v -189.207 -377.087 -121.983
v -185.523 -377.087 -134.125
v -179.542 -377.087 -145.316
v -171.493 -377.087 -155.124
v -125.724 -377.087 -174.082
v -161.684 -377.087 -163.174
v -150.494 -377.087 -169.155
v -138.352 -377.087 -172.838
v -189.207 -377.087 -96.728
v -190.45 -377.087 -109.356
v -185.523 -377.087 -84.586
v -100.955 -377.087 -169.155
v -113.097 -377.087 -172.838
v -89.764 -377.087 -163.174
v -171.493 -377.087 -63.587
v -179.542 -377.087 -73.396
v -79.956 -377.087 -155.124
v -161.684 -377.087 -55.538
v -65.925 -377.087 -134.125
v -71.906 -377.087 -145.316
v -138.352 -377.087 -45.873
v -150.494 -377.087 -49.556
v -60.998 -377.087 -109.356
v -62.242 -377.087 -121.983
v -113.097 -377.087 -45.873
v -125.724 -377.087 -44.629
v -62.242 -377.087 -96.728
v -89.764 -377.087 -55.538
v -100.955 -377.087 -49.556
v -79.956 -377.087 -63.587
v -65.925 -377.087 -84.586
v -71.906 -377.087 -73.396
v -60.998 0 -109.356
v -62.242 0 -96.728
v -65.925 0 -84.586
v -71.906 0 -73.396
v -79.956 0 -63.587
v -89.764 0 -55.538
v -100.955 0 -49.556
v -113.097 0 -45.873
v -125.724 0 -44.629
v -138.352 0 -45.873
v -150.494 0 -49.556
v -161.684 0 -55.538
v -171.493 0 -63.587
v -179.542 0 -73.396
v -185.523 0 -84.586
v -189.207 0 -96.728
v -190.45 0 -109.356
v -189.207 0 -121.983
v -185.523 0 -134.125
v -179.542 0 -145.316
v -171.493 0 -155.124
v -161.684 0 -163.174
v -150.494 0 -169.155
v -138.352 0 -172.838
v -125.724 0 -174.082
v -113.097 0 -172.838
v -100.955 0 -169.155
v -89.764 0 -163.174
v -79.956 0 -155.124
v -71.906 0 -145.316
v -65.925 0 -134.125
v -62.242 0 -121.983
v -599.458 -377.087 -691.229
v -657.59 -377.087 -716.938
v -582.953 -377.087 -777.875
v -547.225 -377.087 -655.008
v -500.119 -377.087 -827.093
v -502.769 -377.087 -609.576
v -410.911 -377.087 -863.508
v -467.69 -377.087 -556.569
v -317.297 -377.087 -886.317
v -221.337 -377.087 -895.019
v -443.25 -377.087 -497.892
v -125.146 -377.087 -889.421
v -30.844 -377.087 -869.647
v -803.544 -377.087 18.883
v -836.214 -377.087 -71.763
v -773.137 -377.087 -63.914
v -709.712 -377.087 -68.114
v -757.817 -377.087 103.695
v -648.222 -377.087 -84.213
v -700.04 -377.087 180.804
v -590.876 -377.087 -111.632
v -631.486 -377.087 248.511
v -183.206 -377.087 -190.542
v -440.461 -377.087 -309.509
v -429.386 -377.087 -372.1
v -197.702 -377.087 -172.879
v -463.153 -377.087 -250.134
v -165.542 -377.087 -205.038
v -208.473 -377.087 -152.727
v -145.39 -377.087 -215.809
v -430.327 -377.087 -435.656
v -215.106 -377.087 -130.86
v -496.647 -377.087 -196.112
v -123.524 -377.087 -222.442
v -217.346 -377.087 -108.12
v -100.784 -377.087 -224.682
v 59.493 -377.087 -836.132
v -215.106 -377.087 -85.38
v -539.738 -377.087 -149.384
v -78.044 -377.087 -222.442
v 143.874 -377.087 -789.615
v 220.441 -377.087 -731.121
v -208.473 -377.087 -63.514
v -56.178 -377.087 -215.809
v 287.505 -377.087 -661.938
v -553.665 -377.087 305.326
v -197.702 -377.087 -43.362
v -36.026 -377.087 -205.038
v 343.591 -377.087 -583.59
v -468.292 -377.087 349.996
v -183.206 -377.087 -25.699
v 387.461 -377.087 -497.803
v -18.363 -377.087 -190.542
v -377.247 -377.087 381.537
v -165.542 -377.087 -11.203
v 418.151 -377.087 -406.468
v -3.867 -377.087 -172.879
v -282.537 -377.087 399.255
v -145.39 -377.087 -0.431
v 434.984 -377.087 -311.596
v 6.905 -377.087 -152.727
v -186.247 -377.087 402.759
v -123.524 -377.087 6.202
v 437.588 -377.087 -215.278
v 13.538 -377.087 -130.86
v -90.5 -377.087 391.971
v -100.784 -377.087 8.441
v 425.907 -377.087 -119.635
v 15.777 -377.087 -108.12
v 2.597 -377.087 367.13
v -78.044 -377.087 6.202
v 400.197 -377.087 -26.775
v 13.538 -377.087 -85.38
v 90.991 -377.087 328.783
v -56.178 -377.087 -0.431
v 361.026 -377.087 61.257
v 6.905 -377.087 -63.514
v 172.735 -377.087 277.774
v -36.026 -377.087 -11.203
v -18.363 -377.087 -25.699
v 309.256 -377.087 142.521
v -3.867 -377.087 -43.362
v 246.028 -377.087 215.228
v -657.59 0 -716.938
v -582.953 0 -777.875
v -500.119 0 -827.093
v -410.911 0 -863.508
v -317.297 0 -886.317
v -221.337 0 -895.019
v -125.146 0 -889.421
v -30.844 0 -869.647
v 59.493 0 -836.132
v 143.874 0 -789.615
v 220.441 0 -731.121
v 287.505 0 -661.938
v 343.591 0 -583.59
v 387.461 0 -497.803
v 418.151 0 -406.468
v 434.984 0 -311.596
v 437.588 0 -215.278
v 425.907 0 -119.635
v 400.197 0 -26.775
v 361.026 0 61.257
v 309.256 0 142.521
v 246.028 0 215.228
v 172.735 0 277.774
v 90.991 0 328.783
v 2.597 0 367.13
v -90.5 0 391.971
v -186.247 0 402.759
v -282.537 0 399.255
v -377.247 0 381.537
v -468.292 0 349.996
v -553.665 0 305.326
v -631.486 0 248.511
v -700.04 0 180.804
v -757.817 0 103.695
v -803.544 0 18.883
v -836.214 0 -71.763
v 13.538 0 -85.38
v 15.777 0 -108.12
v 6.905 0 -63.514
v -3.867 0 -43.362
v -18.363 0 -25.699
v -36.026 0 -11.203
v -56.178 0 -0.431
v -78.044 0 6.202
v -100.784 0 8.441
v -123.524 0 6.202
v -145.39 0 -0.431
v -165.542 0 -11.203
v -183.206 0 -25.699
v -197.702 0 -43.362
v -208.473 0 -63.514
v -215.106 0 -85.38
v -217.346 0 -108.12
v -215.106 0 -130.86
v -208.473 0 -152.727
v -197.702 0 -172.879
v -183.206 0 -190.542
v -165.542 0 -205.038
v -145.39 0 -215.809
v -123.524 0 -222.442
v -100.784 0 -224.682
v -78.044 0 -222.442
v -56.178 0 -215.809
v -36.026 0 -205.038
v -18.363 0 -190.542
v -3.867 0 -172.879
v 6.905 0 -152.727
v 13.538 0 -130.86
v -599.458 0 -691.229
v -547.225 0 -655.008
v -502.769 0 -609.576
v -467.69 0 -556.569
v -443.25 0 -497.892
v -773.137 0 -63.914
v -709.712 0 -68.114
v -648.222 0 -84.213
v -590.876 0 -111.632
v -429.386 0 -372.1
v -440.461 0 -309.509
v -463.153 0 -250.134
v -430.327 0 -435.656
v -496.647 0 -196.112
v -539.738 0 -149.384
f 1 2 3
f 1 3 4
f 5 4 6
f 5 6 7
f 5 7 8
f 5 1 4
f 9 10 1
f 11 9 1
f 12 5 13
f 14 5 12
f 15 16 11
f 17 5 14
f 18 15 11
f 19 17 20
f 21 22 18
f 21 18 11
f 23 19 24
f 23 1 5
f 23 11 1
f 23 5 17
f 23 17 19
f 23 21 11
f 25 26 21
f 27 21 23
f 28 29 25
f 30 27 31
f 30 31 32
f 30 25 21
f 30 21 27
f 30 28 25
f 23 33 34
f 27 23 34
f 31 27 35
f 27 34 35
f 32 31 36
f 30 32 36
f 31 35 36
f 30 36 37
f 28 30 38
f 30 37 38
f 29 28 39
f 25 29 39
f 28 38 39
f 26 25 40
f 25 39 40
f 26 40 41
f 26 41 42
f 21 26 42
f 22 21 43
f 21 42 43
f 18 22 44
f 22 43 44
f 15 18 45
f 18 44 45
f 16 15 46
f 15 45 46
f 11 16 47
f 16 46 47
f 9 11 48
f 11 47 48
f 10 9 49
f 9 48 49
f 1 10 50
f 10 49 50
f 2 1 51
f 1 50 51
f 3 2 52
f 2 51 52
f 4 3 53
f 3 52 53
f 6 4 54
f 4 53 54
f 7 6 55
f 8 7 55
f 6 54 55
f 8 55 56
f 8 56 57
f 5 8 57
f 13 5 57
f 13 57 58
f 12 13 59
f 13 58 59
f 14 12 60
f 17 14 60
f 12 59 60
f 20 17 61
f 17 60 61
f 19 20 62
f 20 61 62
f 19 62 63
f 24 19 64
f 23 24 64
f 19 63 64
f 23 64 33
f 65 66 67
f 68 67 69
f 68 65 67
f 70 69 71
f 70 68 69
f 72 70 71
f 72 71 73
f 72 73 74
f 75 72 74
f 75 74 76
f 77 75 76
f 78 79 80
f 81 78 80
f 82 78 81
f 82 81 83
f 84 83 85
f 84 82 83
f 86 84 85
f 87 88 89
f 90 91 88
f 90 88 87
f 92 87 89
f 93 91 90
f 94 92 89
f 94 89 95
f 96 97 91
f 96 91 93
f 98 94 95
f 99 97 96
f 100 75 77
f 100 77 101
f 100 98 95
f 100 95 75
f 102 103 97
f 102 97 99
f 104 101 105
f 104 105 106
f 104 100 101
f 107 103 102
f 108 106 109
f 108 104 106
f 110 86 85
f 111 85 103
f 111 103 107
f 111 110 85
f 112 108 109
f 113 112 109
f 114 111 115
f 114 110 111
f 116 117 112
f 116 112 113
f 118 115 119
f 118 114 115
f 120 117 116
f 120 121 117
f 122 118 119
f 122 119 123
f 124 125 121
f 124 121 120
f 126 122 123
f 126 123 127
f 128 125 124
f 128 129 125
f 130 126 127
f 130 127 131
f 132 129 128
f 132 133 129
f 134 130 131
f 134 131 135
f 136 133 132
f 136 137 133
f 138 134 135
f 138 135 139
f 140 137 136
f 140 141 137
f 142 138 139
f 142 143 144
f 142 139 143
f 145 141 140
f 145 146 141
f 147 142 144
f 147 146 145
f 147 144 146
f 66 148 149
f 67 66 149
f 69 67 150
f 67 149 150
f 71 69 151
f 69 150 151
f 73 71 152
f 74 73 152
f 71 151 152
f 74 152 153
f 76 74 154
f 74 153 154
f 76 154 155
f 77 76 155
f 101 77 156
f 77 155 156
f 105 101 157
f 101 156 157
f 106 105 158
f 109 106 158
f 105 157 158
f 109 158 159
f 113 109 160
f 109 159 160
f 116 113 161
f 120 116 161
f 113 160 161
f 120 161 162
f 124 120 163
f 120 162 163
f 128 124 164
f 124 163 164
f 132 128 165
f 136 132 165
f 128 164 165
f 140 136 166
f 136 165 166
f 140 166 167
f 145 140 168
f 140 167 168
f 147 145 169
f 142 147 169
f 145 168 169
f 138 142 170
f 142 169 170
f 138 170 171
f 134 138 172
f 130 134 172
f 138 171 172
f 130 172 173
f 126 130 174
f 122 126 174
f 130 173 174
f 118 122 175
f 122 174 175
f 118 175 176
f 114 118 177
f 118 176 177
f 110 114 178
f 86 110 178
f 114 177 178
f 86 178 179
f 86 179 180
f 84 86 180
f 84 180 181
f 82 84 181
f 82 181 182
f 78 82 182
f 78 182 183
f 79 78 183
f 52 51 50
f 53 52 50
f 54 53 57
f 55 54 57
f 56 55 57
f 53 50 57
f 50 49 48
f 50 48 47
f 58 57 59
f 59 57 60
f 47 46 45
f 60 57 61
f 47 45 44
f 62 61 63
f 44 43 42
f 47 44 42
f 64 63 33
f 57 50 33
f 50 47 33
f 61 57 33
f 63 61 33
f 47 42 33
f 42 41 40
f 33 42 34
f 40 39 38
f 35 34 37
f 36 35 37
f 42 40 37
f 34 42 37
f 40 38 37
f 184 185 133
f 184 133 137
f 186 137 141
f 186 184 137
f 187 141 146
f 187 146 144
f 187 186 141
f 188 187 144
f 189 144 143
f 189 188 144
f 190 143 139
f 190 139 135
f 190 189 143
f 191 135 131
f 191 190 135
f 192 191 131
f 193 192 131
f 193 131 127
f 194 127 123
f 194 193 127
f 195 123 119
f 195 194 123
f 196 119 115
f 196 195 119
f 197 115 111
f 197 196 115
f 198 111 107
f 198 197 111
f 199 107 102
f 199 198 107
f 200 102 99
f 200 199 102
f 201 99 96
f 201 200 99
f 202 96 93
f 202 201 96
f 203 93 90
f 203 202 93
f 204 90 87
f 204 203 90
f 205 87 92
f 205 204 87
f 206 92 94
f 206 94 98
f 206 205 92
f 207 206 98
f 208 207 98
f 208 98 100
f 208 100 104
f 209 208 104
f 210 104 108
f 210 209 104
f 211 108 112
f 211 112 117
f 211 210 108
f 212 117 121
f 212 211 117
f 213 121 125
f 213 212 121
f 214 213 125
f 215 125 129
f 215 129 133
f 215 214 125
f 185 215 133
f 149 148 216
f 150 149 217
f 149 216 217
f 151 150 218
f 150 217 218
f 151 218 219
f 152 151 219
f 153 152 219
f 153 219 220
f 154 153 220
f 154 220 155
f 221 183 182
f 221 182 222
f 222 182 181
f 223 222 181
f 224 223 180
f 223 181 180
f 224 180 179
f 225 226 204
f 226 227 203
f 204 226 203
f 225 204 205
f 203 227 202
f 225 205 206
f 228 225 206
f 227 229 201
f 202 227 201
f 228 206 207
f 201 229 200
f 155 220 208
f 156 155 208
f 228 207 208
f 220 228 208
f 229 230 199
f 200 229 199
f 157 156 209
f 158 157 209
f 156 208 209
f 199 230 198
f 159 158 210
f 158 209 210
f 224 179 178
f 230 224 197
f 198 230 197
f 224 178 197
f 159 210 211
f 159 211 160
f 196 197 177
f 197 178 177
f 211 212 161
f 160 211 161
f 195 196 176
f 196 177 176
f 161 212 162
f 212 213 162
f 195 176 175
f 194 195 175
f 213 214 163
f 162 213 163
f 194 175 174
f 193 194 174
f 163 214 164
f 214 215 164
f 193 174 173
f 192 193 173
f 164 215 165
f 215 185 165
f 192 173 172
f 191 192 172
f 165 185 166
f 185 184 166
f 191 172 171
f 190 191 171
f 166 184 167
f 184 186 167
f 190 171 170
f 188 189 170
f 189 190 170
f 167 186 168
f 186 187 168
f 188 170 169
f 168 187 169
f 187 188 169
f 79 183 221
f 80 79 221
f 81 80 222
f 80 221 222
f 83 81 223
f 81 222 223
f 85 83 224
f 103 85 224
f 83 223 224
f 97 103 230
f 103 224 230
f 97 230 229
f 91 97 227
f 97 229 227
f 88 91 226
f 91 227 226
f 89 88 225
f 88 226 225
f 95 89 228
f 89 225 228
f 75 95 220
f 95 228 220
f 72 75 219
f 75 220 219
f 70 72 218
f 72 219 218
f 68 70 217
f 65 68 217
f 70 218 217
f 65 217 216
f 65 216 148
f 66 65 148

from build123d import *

# Parameters (mm, degrees)
F0_R     = 64.7262264748
F1_DEPTH = 377.0865797997
F0_R_2   = 116.561623304


with BuildPart() as f1:
    # F0 (on Front) → F1 (new body)
    with BuildSketch(Plane.XZ):
        with Locations((-125.7242560387, -109.355635941)):
            Circle(F0_R)
    extrude(amount=F1_DEPTH)


with BuildPart() as f1b:
    # F0 (on Front) → F1, piece 2 (new body)
    with BuildSketch(Plane.XZ):
        with BuildLine():
            ThreePointArc((-657.5901740627, -716.937780029), (45.4758205773, -842.3540002409), (438.312356026, -245.9393143654))
            ThreePointArc((438.312356026, -245.9393143654), (-122.9545263453, 397.2468891623), (-836.2136816928, -71.7631138953))
            ThreePointArc((-836.2136816928, -71.7631138953), (-553.7653222493, -137.4859582639), (-428.3094351106, -398.9384174347))
            ThreePointArc((-428.3094351106, -398.9384174347), (-491.6065911088, -594.957072073), (-657.5901740627, -716.937780029))
        make_face()
        with Locations((-100.7842943072, -108.1203520298)):
            Circle(F0_R_2, mode=Mode.SUBTRACT)
    extrude(amount=F1_DEPTH)


solid = Compound([f1.part, f1b.part])
